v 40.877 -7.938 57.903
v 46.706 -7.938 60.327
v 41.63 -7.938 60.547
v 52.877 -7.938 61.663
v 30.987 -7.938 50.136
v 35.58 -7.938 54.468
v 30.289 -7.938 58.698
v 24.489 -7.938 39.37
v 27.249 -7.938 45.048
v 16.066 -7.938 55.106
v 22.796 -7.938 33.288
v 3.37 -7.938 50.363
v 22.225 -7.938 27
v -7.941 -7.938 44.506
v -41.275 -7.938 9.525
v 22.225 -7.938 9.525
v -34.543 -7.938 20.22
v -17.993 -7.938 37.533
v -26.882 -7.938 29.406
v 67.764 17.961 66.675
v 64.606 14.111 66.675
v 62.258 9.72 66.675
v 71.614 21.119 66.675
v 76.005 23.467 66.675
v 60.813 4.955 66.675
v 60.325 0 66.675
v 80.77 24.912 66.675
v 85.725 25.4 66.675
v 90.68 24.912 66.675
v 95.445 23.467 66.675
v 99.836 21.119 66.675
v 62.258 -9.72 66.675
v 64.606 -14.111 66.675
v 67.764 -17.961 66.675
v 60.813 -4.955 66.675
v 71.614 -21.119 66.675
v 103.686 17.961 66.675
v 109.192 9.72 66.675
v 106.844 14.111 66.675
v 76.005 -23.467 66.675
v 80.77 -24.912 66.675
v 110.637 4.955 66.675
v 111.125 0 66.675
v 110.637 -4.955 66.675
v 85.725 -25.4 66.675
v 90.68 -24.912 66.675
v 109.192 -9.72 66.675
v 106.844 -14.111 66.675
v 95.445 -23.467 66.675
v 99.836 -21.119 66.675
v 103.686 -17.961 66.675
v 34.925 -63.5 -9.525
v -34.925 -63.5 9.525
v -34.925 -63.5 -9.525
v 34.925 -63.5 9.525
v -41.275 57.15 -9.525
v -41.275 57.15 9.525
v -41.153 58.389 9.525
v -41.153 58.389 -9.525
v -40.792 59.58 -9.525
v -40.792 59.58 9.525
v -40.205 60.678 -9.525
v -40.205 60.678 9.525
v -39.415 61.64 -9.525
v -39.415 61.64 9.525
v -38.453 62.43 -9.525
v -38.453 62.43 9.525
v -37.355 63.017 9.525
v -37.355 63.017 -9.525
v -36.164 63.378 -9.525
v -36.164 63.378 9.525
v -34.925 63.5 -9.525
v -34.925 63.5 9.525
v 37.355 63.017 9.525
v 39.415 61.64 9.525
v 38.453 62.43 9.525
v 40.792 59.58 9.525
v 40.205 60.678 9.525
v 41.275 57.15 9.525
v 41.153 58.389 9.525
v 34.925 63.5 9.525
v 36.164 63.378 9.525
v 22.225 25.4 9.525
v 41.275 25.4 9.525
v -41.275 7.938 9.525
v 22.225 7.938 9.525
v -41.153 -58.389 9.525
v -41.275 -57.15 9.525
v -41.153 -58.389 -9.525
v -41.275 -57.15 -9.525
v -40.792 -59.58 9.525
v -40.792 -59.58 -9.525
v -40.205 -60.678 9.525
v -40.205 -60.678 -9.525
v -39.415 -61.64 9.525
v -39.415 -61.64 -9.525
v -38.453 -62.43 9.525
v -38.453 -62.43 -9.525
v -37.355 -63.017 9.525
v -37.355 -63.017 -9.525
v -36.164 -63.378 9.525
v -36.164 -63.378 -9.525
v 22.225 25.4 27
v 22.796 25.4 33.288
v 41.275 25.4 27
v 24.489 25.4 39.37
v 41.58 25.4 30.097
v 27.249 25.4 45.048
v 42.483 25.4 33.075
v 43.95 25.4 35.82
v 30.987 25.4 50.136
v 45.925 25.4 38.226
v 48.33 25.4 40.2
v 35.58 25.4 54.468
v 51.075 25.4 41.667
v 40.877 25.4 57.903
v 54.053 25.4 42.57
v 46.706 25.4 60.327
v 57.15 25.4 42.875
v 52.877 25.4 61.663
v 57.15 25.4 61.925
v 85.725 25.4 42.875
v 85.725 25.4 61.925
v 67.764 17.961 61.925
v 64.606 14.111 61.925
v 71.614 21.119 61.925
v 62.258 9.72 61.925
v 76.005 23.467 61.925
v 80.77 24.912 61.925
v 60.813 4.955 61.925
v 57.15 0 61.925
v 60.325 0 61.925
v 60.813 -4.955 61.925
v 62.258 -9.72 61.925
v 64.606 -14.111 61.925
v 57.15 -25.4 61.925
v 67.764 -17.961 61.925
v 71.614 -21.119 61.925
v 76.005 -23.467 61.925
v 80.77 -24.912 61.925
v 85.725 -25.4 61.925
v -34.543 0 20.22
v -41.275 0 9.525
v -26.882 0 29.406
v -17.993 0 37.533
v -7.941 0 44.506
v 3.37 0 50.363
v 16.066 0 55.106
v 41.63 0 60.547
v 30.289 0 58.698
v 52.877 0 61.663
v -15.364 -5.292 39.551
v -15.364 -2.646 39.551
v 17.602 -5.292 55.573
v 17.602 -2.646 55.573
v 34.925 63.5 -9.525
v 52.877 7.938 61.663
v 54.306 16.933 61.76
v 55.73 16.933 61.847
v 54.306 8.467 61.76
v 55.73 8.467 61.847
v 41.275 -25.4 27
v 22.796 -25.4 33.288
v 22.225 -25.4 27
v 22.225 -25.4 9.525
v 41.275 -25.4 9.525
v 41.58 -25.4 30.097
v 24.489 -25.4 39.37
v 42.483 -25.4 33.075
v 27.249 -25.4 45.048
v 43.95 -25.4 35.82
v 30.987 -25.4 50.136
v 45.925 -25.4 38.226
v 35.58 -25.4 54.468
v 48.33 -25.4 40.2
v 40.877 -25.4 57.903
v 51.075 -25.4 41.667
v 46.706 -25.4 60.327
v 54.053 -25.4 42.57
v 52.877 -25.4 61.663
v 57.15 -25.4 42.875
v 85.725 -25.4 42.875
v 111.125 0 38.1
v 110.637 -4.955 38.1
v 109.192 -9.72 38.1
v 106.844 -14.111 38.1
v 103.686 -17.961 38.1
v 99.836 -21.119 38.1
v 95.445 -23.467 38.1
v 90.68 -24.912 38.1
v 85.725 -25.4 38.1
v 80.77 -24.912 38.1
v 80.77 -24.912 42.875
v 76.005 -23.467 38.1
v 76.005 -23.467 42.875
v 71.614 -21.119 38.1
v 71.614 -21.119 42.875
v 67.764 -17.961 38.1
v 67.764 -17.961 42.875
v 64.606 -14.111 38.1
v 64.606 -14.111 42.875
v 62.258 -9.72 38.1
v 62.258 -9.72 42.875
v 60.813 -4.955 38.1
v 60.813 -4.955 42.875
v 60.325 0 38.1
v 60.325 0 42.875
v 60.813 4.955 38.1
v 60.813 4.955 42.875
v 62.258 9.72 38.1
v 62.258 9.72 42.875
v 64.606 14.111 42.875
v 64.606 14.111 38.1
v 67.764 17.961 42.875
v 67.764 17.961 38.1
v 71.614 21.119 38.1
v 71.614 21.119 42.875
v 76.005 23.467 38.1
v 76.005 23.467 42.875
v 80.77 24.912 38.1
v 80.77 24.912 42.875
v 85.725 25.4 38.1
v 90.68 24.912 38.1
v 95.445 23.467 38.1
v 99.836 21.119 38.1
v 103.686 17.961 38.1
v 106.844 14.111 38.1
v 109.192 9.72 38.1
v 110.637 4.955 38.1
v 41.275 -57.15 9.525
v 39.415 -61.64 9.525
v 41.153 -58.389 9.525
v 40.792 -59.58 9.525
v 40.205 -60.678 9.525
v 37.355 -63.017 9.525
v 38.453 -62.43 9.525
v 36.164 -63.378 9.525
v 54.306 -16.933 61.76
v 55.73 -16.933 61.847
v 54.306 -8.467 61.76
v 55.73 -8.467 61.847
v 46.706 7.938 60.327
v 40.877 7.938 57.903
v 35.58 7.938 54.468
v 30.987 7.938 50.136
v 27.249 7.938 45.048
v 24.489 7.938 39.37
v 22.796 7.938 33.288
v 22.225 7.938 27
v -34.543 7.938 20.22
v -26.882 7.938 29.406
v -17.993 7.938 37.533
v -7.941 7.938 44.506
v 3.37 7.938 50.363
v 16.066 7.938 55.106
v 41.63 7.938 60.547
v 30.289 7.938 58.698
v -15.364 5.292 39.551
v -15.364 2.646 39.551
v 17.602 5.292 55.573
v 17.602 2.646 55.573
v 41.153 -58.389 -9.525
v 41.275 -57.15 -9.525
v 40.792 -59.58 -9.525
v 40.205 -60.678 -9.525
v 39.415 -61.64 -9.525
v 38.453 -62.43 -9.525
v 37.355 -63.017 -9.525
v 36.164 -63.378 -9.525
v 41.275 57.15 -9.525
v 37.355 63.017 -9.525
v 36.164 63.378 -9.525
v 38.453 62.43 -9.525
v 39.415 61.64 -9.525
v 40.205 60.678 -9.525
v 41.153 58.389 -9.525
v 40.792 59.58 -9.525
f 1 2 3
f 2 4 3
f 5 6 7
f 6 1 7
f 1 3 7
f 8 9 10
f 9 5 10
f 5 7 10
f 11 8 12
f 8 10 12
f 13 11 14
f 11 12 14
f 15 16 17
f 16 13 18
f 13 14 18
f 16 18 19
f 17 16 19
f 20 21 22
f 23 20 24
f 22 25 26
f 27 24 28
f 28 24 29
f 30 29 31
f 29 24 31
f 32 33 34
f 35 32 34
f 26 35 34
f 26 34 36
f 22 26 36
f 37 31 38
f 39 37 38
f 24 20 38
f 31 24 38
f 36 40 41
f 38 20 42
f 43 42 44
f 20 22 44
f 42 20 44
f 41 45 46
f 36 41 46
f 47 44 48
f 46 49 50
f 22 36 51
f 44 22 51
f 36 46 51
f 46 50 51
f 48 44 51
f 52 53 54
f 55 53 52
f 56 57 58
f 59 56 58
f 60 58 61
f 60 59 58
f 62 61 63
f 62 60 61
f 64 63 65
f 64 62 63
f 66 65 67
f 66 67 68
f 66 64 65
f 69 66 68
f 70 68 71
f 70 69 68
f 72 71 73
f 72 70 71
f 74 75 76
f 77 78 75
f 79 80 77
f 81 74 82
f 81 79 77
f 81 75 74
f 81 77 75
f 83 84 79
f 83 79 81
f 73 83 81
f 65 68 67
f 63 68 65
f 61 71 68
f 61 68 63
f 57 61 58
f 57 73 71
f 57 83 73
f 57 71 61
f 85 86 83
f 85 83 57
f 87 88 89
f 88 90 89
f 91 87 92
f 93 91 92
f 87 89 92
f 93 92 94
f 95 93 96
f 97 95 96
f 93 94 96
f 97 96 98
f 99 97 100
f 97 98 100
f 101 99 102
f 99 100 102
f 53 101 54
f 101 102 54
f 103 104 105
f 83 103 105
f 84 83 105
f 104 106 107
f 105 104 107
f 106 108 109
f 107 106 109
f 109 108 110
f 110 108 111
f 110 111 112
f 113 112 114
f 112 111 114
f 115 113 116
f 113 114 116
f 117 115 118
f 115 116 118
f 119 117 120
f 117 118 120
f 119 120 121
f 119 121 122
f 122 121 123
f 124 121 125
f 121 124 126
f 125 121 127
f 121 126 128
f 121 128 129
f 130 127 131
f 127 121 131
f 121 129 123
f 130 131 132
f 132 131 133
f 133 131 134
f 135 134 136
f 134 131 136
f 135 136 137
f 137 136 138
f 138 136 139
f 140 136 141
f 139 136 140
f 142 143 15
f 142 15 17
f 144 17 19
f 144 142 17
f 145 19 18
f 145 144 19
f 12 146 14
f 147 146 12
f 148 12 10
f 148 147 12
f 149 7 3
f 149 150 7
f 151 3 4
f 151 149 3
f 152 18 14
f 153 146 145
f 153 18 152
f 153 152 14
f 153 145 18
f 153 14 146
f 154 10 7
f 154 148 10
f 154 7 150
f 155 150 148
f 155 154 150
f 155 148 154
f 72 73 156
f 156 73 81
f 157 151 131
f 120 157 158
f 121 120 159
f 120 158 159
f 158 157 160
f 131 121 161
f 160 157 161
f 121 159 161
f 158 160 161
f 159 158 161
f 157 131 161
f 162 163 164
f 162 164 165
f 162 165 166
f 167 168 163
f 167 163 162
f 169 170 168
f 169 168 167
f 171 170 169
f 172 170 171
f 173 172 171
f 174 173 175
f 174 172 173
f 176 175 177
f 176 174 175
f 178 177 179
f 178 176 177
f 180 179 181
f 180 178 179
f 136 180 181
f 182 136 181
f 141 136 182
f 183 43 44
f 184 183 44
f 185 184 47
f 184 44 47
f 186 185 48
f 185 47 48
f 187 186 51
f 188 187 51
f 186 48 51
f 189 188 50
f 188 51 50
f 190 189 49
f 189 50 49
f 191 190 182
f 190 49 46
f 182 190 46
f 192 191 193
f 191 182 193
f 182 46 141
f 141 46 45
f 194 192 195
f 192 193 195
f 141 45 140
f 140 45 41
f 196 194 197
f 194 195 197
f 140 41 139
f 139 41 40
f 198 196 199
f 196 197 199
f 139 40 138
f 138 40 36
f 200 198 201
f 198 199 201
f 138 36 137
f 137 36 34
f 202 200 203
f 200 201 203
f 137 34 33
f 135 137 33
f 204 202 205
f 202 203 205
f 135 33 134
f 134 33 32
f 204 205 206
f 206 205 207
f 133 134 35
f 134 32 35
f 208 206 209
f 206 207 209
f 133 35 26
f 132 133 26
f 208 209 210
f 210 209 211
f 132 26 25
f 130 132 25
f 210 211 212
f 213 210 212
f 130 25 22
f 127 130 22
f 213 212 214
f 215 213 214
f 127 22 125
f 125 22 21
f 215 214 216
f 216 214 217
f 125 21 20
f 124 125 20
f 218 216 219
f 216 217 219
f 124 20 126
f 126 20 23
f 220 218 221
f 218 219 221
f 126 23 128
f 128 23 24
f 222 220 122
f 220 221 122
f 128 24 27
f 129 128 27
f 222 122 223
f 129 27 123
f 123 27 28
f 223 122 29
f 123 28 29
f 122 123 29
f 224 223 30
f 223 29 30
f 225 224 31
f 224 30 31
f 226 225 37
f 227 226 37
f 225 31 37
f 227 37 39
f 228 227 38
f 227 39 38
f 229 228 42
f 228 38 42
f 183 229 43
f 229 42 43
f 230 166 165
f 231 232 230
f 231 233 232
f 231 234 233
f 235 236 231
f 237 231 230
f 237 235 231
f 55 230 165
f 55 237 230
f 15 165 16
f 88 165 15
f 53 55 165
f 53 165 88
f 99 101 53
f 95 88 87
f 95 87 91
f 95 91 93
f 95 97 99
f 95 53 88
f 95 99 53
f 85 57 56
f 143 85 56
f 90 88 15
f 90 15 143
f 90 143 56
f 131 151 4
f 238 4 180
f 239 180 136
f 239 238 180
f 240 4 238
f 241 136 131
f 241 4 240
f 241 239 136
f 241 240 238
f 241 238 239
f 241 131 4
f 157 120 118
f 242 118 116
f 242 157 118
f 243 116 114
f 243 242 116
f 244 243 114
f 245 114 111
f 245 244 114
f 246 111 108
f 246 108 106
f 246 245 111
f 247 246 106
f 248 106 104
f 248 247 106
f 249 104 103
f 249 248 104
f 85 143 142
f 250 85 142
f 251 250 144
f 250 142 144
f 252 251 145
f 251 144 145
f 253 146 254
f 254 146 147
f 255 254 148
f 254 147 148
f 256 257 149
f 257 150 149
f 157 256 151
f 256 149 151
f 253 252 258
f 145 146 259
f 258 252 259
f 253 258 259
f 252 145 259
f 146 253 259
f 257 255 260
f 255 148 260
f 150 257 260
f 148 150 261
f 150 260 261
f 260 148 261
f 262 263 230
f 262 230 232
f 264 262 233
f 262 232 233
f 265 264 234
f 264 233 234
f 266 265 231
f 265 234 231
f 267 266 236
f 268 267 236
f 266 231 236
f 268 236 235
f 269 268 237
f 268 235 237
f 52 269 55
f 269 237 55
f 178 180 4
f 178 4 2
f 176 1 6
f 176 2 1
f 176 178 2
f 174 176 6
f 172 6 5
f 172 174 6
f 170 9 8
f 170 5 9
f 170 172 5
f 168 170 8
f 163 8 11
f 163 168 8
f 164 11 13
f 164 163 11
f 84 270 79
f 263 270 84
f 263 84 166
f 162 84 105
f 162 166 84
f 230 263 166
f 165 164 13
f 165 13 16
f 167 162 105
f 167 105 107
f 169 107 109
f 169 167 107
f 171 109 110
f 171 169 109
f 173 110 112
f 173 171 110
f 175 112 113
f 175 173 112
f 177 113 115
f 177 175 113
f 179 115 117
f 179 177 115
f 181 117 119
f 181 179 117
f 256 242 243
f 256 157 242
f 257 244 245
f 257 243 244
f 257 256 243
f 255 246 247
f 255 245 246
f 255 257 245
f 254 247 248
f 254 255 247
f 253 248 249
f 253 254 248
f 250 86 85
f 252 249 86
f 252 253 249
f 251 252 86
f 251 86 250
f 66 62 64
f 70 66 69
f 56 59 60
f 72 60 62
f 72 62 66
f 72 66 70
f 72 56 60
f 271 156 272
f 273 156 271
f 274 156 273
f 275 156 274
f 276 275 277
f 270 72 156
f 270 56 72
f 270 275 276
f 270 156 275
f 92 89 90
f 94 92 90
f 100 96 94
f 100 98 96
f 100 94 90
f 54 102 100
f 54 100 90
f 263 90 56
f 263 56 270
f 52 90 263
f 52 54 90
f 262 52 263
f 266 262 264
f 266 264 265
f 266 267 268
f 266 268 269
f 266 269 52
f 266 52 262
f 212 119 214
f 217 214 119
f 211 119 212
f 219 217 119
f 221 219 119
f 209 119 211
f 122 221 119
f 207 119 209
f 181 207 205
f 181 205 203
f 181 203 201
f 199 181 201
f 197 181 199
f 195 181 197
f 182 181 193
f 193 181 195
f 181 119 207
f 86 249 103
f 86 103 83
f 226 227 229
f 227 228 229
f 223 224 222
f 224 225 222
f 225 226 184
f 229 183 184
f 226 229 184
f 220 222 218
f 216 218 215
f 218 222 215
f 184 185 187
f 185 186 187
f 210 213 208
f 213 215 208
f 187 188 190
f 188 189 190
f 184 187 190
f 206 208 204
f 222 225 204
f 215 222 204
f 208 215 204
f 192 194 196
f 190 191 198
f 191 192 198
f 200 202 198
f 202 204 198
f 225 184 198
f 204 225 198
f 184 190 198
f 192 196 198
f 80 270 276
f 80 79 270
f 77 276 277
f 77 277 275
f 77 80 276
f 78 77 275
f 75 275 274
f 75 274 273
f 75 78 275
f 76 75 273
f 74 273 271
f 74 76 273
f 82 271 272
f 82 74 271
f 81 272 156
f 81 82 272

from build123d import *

# Parameters (mm, degrees)
F1_DEPTH = 63.5
F2_DEPTH = 25.4
F3_DEPTH = 7.9375
F0_W     = 25.4
F0_H     = 19.05
F4_DEPTH = 25.4
F6_R     = 6.35


with BuildPart() as f1:
    # F0 (on Front) → F1 (new body, symmetric)
    with BuildSketch(Plane.XZ):
        Polygon((22.225, 9.525), (-41.275, 9.525), (-41.275, -9.525), (41.275, -9.525), (41.275, 9.525), align=None)
    extrude(amount=F1_DEPTH, both=True)

    # F0 (on Front) → F2 (join, symmetric)
    with BuildSketch(Plane.XZ):
        with BuildLine():
            Line((22.225, 27.0002), (22.225, 9.525))
            Line((22.225, 9.525), (41.275, 9.525))
            Line((41.275, 9.525), (41.275, 27.0002))
            ThreePointArc((41.275, 27.0002), (45.92468, 38.22552), (57.15, 42.8752))
            Line((57.15, 42.8752), (60.325, 42.8752))
            Line((60.325, 42.8752), (60.325, 61.9252))
            Line((60.325, 61.9252), (57.15, 61.9252))
            add(Edge.make_bspline(
                [(52.876999, 61.662818), (54.307987, 61.76468), (55.732814, 61.851718), (57.15, 61.9252)],
                knots=[107.106385, 107.106385, 107.106385, 107.106385, 111.504536, 111.504536, 111.504536, 111.504536], degree=3))
            ThreePointArc((52.876999, 61.662818), (30.987143, 50.135898), (22.225, 27.0002))
        make_face()
    extrude(amount=F2_DEPTH, both=True)

    # F0 (on Front) → F3 (join, symmetric)
    with BuildSketch(Plane.XZ):
        with BuildLine():
            add(Edge.make_bspline(
                [(-41.275, 9.525), (-20.473646, 47.910034), (18.028728, 59.18221), (52.876999, 61.662818)],
                knots=[0, 0, 0, 0, 107.106385, 107.106385, 107.106385, 107.106385], degree=3))
            Line((-41.275, 9.525), (22.225, 9.525))
            Line((22.225, 9.525), (22.225, 27.0002))
            ThreePointArc((22.225, 27.0002), (30.987143, 50.135898), (52.876999, 61.662818))
        make_face()
    extrude(amount=F3_DEPTH, both=True)

    # F0 (on Front) → F4 (join, symmetric)
    with BuildSketch(Plane.XZ):
        with Locations((73.025, 52.4002)):
            Rectangle(F0_W, F0_H)
    extrude(amount=F4_DEPTH, both=True)

    # F0 (on Front) → F5 (revolve)
    with BuildSketch(Plane.XZ):
        Polygon((85.725, 66.675), (85.725, 61.9252), (85.725, 42.8752), (85.725, 38.1), (111.125, 38.1), (111.125, 66.675), align=None)
    revolve(axis=Axis((85.725, 0, 52.3875), (0, 0, -1)))

    # F6
    f6_edges = [f1.edges().sort_by_distance(p)[0] for p in [
        (41.275, -63.5, 0),
        (41.275, 63.5, 0),
        (-41.275, 63.5, 0),
        (-41.275, -63.5, 0),
    ]]
    fillet(f6_edges, radius=F6_R)


solid = f1.part
